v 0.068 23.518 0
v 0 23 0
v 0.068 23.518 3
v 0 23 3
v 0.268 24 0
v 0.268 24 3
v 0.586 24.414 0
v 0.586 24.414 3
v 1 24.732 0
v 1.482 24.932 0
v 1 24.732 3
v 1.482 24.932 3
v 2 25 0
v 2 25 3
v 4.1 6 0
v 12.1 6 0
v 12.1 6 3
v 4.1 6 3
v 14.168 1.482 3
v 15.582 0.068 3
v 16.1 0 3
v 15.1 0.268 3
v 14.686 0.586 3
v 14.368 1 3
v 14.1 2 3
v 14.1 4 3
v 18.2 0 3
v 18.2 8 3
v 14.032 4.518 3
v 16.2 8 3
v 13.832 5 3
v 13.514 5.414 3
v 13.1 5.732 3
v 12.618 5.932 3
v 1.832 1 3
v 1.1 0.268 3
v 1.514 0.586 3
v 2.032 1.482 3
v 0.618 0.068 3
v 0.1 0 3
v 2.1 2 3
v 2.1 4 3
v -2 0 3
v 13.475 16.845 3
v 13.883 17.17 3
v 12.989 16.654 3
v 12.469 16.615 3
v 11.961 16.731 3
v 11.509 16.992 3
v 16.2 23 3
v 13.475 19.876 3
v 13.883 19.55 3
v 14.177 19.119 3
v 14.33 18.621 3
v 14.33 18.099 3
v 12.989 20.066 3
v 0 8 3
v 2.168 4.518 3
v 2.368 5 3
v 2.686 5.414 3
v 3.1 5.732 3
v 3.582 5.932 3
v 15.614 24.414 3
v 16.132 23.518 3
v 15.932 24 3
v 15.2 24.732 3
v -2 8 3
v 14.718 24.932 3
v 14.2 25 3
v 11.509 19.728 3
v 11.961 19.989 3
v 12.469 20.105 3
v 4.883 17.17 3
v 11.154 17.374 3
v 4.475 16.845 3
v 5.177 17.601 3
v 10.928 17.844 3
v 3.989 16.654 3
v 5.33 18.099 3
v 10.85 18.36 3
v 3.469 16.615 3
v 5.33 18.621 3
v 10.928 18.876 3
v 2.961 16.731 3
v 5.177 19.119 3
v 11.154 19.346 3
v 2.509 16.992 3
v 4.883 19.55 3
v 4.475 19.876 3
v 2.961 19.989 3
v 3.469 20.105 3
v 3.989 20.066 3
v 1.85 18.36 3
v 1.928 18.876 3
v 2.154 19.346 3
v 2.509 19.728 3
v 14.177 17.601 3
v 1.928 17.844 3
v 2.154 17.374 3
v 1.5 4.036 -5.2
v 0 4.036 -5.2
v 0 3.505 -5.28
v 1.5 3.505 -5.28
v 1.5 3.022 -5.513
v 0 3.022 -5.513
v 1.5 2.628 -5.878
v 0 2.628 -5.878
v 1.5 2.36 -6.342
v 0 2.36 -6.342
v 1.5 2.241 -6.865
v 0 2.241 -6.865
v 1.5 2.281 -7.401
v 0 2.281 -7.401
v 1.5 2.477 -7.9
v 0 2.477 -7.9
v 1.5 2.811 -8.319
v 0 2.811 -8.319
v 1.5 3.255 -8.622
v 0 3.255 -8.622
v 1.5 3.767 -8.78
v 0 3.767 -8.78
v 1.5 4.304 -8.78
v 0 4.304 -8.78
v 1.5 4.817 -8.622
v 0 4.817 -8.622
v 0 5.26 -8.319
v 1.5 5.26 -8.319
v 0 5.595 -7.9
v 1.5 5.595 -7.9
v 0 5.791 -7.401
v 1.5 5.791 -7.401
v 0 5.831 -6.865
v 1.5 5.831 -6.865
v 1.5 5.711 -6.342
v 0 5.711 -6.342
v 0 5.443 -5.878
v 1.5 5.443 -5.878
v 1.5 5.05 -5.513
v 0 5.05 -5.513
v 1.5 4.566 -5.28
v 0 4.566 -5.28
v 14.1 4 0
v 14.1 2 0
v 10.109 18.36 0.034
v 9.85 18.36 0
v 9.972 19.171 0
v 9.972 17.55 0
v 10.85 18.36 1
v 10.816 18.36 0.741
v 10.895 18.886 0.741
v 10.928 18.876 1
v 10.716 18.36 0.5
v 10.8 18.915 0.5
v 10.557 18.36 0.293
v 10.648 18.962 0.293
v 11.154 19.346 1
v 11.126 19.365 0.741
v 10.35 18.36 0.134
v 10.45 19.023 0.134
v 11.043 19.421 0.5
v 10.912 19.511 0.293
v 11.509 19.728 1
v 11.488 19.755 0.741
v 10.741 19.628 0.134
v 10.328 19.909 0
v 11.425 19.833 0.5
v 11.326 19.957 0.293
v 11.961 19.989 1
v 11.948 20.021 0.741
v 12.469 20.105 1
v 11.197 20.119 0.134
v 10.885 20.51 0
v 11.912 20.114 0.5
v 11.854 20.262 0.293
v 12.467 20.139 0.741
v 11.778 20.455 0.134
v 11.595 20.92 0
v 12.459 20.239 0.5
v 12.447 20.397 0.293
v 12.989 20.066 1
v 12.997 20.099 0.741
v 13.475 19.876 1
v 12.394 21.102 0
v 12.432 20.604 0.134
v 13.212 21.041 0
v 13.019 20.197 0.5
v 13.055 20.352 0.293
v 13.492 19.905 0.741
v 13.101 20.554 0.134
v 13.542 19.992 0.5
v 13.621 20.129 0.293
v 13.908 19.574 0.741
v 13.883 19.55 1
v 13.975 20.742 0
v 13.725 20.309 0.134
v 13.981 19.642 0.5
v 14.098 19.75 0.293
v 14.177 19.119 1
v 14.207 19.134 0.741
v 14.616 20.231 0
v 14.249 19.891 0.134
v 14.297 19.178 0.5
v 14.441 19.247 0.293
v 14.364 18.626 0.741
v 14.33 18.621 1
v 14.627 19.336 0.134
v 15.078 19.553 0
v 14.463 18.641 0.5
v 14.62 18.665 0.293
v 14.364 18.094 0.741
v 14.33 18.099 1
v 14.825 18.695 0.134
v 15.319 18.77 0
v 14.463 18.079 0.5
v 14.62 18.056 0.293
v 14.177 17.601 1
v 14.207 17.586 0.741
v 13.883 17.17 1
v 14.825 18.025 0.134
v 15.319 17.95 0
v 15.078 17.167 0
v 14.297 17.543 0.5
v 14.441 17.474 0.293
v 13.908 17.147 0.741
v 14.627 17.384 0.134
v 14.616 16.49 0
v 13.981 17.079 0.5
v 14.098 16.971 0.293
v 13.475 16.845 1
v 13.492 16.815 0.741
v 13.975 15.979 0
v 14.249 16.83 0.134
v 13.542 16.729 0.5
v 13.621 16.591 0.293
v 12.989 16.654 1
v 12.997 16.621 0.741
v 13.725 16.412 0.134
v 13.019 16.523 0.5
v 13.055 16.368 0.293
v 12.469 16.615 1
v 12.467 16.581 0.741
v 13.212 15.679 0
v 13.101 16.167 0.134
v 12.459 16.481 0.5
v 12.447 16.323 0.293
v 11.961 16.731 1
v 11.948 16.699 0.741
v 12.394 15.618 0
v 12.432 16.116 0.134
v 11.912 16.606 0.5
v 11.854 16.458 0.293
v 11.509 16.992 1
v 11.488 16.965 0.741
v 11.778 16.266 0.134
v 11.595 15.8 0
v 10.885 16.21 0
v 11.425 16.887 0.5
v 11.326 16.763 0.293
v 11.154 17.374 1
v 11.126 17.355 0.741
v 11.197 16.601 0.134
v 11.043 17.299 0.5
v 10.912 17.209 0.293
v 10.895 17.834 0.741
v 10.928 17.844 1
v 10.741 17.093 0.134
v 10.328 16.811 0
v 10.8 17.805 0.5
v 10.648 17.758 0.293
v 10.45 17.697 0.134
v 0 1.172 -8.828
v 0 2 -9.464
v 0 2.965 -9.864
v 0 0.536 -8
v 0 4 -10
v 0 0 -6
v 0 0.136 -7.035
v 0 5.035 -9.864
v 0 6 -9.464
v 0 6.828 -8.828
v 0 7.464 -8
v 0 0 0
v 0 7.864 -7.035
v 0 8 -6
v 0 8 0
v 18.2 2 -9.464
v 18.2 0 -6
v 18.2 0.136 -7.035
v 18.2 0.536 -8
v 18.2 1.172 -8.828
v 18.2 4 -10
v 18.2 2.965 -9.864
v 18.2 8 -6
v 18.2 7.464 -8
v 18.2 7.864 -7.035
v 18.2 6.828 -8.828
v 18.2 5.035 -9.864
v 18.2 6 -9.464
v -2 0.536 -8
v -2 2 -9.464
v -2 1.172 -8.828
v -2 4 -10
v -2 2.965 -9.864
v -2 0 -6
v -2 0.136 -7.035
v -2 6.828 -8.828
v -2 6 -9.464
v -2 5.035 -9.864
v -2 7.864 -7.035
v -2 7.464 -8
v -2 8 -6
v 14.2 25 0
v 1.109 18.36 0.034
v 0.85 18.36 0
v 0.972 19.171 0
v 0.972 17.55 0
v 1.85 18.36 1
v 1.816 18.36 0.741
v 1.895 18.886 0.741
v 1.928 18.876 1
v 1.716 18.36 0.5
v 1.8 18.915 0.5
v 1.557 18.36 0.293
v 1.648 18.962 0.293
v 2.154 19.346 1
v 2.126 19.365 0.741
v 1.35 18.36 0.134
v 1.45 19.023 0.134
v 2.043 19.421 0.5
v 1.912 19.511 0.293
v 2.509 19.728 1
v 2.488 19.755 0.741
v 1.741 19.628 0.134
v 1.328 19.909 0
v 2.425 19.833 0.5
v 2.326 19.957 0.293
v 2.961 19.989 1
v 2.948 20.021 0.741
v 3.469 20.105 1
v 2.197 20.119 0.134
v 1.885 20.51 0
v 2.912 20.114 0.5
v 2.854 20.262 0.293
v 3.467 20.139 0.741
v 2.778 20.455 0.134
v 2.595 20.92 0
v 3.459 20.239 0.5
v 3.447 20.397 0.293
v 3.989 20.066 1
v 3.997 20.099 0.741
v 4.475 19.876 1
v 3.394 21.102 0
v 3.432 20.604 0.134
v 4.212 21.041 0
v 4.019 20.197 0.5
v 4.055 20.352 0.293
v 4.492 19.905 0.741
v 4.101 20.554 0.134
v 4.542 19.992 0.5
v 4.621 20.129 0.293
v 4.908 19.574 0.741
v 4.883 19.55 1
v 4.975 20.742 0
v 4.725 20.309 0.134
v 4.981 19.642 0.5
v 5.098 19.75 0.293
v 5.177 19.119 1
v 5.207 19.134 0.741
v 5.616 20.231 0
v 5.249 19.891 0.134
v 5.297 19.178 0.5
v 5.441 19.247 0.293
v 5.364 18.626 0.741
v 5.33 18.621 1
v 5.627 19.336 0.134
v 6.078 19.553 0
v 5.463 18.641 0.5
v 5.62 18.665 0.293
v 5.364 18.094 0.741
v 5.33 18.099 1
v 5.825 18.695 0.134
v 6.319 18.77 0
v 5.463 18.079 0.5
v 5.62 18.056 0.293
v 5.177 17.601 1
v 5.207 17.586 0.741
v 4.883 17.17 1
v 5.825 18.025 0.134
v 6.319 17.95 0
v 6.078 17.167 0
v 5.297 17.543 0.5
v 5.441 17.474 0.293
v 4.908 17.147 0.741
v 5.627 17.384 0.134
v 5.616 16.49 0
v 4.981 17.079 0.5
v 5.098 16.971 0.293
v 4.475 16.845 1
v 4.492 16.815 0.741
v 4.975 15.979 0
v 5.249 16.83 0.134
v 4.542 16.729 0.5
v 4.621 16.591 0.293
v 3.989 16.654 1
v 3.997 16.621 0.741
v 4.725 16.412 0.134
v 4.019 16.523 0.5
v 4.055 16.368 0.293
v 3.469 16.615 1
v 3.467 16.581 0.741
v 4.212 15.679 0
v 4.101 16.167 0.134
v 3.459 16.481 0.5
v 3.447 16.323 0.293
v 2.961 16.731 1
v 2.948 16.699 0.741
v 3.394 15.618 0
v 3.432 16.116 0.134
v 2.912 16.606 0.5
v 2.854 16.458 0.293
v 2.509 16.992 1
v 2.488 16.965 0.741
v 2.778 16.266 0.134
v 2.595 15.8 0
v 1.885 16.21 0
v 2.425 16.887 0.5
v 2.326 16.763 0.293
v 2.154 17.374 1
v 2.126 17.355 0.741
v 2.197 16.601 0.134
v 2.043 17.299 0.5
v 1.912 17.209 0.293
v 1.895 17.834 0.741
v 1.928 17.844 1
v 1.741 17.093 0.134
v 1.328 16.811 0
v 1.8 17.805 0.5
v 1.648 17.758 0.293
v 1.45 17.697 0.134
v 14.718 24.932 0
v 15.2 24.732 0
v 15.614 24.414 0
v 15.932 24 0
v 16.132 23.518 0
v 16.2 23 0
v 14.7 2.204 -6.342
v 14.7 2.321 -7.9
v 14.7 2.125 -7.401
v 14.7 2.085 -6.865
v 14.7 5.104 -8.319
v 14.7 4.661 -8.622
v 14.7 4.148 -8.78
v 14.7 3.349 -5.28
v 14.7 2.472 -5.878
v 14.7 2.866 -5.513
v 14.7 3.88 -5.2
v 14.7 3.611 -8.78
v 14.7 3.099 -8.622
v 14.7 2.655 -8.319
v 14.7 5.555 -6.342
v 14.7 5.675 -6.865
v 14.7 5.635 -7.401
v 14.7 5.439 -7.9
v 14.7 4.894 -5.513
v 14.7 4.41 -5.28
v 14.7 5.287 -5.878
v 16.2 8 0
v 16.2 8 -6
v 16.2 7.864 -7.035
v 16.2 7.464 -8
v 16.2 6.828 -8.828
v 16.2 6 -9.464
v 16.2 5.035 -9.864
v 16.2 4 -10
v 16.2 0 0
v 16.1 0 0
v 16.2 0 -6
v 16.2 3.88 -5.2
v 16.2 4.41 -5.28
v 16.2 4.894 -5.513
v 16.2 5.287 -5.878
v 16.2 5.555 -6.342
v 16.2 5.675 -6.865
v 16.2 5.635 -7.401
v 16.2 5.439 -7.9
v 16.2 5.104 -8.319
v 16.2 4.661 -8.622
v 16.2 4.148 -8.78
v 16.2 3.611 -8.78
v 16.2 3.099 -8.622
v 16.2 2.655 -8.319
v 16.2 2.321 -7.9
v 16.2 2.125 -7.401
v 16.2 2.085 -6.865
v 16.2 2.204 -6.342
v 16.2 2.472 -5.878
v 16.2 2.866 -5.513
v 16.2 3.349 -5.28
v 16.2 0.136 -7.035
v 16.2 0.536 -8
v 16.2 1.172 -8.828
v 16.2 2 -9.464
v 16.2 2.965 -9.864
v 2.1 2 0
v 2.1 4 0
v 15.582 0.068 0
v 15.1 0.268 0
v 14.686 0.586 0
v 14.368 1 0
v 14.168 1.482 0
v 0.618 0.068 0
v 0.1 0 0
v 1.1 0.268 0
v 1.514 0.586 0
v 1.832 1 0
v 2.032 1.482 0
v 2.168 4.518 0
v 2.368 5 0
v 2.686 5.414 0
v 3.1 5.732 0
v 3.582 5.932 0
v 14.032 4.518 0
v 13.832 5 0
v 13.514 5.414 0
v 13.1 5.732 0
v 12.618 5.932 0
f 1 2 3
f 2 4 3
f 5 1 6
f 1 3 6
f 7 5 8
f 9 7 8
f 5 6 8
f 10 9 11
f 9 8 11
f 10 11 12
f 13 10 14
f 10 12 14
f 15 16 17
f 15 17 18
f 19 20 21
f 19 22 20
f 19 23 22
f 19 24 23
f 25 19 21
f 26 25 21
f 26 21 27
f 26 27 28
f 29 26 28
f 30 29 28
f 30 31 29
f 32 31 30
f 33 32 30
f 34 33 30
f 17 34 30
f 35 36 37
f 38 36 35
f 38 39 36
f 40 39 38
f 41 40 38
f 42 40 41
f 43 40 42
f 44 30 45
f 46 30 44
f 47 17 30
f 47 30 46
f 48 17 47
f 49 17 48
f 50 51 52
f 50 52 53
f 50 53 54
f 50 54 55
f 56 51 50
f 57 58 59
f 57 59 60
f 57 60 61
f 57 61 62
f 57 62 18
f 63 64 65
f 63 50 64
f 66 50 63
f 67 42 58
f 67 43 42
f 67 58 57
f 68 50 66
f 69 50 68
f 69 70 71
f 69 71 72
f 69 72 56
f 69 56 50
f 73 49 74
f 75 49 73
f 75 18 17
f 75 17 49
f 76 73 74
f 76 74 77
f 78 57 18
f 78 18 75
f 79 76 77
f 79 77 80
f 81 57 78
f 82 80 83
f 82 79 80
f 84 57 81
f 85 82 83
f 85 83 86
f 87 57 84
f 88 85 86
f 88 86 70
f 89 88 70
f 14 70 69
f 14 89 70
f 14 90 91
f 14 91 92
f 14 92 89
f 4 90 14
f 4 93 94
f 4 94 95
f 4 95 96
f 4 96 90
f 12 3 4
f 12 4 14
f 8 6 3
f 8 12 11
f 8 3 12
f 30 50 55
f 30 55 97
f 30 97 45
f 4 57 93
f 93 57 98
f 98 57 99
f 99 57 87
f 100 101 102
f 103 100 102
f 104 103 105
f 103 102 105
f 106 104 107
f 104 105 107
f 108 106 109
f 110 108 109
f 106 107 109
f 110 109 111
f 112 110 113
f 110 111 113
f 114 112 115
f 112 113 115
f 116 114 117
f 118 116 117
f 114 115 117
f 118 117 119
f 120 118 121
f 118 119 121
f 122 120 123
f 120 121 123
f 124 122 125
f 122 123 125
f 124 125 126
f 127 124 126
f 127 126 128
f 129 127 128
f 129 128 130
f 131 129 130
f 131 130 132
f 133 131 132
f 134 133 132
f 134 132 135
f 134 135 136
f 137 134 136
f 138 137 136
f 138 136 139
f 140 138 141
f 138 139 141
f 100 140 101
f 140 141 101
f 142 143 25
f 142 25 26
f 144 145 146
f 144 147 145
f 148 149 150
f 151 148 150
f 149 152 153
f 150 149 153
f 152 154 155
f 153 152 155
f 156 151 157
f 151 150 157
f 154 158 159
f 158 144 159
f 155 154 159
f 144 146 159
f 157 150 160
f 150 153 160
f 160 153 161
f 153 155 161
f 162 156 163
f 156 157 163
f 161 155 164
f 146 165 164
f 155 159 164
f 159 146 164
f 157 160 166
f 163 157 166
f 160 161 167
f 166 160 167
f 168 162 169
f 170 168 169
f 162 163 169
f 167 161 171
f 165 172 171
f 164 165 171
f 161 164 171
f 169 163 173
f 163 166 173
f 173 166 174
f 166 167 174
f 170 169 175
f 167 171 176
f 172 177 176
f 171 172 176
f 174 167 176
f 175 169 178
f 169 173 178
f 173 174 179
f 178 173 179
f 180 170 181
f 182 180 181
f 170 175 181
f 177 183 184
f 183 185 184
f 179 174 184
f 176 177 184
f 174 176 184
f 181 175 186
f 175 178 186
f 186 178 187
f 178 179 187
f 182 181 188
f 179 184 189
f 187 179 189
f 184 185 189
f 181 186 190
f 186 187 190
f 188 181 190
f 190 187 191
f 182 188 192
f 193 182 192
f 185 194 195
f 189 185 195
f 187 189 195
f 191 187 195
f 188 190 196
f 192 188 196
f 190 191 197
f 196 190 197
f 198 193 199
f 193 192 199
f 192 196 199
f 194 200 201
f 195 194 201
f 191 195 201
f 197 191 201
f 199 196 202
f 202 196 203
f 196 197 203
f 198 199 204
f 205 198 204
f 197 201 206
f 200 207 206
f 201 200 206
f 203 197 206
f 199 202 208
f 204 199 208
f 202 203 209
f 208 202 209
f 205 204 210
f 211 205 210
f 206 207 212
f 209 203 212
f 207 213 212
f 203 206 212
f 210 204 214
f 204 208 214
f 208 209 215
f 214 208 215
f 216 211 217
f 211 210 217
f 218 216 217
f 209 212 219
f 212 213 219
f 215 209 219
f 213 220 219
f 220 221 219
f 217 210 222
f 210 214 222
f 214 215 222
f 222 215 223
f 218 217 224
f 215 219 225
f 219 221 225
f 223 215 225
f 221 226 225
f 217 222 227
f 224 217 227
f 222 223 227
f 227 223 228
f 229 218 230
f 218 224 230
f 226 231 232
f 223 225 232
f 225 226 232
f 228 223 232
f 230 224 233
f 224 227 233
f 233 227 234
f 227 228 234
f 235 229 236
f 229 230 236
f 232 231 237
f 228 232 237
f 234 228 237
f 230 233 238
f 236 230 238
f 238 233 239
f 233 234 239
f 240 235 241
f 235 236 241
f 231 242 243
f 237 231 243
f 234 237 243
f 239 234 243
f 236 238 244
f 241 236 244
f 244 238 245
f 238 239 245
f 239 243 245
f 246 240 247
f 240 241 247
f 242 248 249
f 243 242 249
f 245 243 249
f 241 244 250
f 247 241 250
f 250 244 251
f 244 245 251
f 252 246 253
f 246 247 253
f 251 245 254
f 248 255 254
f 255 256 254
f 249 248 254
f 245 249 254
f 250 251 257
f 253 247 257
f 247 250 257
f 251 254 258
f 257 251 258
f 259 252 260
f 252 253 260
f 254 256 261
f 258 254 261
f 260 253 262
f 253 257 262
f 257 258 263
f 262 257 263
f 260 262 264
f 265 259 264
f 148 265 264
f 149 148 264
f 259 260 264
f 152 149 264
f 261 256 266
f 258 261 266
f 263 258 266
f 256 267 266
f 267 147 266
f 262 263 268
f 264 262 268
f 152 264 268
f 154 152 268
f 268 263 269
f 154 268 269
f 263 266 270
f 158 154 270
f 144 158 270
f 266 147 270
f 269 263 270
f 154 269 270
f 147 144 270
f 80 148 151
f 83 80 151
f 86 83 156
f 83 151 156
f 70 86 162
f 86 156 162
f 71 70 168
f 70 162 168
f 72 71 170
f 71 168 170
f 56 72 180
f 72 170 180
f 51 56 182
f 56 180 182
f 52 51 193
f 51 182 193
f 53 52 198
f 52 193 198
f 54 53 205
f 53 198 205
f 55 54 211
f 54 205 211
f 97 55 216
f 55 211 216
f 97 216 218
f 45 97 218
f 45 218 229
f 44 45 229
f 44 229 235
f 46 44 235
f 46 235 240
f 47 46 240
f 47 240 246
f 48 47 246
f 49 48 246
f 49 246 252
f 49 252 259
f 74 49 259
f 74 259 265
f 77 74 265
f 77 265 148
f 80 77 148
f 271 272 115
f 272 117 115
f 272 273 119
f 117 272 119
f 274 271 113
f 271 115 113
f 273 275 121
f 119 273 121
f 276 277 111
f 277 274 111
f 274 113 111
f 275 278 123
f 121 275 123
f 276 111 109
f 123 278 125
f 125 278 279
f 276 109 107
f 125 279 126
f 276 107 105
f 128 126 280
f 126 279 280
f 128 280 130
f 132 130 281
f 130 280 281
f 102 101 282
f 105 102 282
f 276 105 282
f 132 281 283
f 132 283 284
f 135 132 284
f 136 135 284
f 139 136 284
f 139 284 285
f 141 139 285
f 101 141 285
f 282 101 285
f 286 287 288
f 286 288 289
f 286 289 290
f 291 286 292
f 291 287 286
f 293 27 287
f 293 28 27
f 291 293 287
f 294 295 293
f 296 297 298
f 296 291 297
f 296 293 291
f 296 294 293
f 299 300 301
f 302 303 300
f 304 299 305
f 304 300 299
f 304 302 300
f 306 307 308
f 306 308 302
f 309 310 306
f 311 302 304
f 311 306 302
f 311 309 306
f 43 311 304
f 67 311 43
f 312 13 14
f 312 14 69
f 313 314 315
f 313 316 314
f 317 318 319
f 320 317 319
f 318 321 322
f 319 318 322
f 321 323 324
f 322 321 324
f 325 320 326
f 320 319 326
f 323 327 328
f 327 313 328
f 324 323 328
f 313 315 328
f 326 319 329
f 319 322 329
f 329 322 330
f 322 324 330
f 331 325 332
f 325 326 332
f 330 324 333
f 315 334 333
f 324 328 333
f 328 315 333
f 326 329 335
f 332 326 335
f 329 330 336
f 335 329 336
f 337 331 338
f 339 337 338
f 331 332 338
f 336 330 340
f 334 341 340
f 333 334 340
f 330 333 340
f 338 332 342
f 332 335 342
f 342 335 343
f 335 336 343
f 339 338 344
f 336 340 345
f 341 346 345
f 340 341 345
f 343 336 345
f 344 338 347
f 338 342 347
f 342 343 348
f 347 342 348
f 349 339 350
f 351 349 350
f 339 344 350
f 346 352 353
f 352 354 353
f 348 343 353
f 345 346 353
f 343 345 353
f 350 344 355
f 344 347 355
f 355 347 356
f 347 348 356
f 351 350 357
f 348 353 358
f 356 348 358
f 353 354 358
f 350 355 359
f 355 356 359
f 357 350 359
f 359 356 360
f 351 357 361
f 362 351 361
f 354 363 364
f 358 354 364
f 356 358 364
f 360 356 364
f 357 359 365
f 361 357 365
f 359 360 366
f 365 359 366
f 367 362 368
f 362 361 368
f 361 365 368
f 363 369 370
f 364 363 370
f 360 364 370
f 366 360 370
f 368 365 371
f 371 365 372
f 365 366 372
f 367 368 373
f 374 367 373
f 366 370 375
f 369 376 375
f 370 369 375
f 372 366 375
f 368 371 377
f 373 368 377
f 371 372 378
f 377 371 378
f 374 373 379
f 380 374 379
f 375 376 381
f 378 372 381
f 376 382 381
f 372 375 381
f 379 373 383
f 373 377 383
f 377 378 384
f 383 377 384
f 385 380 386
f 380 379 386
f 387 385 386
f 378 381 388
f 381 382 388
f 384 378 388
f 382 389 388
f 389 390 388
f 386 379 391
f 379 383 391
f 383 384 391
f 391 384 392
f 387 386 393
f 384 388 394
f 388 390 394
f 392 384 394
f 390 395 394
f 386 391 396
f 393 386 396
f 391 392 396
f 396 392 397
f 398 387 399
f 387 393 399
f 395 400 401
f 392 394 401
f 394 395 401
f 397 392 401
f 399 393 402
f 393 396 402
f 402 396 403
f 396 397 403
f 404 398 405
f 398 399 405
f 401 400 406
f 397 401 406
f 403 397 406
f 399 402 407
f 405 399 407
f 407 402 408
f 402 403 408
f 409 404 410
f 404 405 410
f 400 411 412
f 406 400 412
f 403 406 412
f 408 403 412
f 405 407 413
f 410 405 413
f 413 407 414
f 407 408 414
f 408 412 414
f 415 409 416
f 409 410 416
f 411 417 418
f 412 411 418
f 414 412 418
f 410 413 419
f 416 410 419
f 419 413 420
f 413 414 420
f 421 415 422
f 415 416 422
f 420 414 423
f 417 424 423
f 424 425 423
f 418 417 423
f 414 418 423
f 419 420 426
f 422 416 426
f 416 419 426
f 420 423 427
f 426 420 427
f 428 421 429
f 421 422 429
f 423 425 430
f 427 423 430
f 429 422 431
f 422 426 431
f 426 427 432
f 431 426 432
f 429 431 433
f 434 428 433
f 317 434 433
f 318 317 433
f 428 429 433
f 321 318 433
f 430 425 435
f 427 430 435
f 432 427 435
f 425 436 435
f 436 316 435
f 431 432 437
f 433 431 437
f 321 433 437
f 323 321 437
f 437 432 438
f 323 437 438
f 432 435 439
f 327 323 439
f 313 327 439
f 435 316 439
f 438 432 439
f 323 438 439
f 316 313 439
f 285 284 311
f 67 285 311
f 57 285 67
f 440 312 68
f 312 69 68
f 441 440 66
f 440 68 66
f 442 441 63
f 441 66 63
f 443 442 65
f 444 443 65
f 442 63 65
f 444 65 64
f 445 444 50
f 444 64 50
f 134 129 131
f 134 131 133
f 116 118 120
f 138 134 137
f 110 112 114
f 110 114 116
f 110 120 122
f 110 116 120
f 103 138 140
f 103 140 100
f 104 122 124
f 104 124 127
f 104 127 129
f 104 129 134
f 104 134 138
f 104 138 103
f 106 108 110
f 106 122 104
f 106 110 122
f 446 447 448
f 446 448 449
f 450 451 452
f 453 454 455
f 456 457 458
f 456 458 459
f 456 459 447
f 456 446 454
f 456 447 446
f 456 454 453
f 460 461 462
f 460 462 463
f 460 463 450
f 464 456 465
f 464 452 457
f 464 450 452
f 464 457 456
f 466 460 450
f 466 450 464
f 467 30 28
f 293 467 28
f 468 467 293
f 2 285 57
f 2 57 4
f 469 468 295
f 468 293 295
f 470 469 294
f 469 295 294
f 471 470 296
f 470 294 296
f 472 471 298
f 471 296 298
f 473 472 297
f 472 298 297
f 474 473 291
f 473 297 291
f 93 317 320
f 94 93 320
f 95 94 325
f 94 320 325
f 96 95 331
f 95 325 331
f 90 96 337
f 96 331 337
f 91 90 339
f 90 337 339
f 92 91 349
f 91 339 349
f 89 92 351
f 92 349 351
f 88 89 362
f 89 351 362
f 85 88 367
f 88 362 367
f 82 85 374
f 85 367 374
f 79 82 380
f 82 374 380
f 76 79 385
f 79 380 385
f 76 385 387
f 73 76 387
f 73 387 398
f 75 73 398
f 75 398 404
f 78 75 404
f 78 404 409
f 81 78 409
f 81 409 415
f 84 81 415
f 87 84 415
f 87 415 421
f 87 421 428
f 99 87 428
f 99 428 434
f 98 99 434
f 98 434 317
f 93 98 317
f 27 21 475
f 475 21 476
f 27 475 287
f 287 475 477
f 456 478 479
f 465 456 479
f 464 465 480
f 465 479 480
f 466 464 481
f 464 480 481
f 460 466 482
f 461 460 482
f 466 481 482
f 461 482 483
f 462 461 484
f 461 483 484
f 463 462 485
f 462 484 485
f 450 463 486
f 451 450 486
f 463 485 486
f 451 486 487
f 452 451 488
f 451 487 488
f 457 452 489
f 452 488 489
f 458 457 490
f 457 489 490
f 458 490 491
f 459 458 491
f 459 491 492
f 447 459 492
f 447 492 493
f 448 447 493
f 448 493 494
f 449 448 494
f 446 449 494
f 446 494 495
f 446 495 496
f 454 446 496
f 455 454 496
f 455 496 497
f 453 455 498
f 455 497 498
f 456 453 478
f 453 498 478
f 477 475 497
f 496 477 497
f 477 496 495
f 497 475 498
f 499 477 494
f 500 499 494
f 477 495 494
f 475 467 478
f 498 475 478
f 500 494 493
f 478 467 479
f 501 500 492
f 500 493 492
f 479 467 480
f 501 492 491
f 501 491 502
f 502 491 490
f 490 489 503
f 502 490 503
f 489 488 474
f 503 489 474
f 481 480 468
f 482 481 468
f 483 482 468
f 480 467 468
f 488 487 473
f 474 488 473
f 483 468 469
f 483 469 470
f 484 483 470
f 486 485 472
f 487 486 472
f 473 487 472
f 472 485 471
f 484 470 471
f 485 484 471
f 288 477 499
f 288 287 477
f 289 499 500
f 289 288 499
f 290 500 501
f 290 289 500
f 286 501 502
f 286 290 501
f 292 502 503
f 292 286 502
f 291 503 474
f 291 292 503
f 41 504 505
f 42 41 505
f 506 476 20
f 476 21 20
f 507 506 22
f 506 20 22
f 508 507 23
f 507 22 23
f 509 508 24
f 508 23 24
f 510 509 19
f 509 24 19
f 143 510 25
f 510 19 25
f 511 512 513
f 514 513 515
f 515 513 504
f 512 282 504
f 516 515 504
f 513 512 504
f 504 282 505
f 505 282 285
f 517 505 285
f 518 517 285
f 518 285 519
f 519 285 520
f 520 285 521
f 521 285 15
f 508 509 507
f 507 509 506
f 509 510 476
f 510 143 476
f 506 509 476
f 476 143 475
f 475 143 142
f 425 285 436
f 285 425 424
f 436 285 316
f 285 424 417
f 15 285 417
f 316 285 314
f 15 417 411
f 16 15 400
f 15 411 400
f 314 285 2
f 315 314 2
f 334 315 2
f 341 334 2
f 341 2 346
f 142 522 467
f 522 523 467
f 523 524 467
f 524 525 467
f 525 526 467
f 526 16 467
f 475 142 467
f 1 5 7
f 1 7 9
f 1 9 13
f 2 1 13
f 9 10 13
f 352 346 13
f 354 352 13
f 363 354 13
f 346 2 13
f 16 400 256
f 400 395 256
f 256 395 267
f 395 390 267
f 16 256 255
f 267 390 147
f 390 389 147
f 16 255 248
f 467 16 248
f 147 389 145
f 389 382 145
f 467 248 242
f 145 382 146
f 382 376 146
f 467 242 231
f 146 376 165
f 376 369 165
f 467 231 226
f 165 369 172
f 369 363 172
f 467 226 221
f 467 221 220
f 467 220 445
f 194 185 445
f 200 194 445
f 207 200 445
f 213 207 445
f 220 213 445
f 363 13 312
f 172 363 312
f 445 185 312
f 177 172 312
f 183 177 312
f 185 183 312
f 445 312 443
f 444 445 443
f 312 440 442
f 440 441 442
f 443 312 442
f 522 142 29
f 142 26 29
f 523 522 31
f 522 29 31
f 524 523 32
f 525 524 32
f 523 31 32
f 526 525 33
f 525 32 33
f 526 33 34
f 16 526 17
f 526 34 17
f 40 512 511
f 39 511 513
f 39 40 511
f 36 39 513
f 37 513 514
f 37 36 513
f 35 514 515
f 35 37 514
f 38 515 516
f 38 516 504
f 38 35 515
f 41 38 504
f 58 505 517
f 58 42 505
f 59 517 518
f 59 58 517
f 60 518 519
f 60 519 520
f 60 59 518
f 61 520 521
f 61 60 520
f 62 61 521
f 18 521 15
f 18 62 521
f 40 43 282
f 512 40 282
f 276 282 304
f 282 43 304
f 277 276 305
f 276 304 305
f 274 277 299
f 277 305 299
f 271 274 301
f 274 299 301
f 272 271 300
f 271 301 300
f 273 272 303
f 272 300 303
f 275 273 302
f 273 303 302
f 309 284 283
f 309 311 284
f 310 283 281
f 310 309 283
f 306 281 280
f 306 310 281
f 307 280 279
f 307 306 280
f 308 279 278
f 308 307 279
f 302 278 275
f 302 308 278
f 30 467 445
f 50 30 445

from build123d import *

# Parameters (mm, degrees)
ESQUISSE1_W             = 16.2
ESQUISSE1_H             = 25
BOSS_EXTRU_1_DEPTH      = 3
ESQUISSE2_W             = 13
ESQUISSE2_H             = 8
BOSS_EXTRU_2_DEPTH      = 2
ESQUISSE3_R             = 1.8
BOSS_EXTRU_3_DEPTH      = 1.5
ESQUISSE5_W             = 13
ESQUISSE5_H             = 8
BOSS_EXTRU_4_DEPTH      = 2
ESQUISSE6_R             = 1.8
BOSS_EXTRU_5_DEPTH      = 1.5
ENL_V_MAT_EXTRU_1_REACH = 34.5
ESQUISSE7_W             = 12
ESQUISSE7_H             = 6
ENL_V_MAT_EXTRU_2_REACH = 34.5
ESQUISSE8_R             = 1.75
CONG_1_R                = 1
CONG_2_R                = 4
CONG_3_R                = 2
CONG_4_R                = 2


with BuildPart() as part:
    # Esquisse1 → Boss.-Extru.1 (new body)
    with BuildSketch(Plane.XY):
        with Locations((8.1, 12.5)):
            Rectangle(ESQUISSE1_W, ESQUISSE1_H)
    extrude(amount=BOSS_EXTRU_1_DEPTH)

    # Esquisse2 → Boss.-Extru.2 (add)
    with BuildSketch(Plane.ZY):
        with Locations((-3.5, 4)):
            Rectangle(ESQUISSE2_W, ESQUISSE2_H)
    extrude(amount=BOSS_EXTRU_2_DEPTH)

    # Esquisse3 → Boss.-Extru.3 (add)
    with BuildSketch(Plane(origin=(0, 0, 0), x_dir=(0, 0, -1), z_dir=(1, 0, 0))):
        with Locations(Location((7, 4.035774971, 0), (0, 0, 180))):
            Circle(ESQUISSE3_R)
    extrude(amount=BOSS_EXTRU_3_DEPTH)

    # Esquisse5 → Boss.-Extru.4 (add)
    with BuildSketch(Plane(origin=(16.2, 0, 0), x_dir=(0, 0, -1), z_dir=(1, 0, 0))):
        with Locations((3.5, 4)):
            Rectangle(ESQUISSE5_W, ESQUISSE5_H)
    extrude(amount=BOSS_EXTRU_4_DEPTH)

    # Esquisse6 → Boss.-Extru.5 (add)
    with BuildSketch(Plane.ZY.offset(-16.2)):
        with Locations((-7, 3.879731229)):
            Circle(ESQUISSE6_R)
    extrude(amount=BOSS_EXTRU_5_DEPTH)

    # Esquisse7 → Enlèv. mat.-Extru.1 (cut, up to next)
    with BuildSketch(Plane(origin=(0, 0, 0), x_dir=(-1, 0, 0), z_dir=(0, 0, -1)), mode=Mode.PRIVATE) as enl_v_mat_extru_1_sk1:
        with Locations((-8.1, 3)):
            Rectangle(ESQUISSE7_W, ESQUISSE7_H)
    enl_v_mat_extru_1_tool1 = extrude(enl_v_mat_extru_1_sk1.sketch, amount=-ENL_V_MAT_EXTRU_1_REACH, mode=Mode.PRIVATE) & part.part
    add(enl_v_mat_extru_1_tool1.solids().sort_by_distance((8.1, 3, 0))[0], mode=Mode.SUBTRACT)

    # Esquisse8 → Enlèv. mat.-Extru.2 (cut, up to next)
    with BuildSketch(Plane(origin=(0, 0, 0), x_dir=(-1, 0, 0), z_dir=(0, 0, -1)), mode=Mode.PRIVATE) as enl_v_mat_extru_2_sk1:
        with Locations((-12.6, 18.360124913)):
            Circle(ESQUISSE8_R)
    enl_v_mat_extru_2_tool1 = extrude(enl_v_mat_extru_2_sk1.sketch, amount=-ENL_V_MAT_EXTRU_2_REACH, mode=Mode.PRIVATE) & part.part
    # Esquisse8 → Enlèv. mat.-Extru.2 (cut, up to next)
    with BuildSketch(Plane(origin=(0, 0, 0), x_dir=(-1, 0, 0), z_dir=(0, 0, -1)), mode=Mode.PRIVATE) as enl_v_mat_extru_2_sk2:
        with Locations((-3.6, 18.360124913)):
            Circle(ESQUISSE8_R)
    enl_v_mat_extru_2_tool2 = extrude(enl_v_mat_extru_2_sk2.sketch, amount=-ENL_V_MAT_EXTRU_2_REACH, mode=Mode.PRIVATE) & part.part
    add(enl_v_mat_extru_2_tool1.solids().sort_by_distance((12.6, 18.360125, 0))[0], mode=Mode.SUBTRACT)
    add(enl_v_mat_extru_2_tool2.solids().sort_by_distance((3.6, 18.360125, 0))[0], mode=Mode.SUBTRACT)

    # Congé1
    cong_1_edges = [part.edges().sort_by_distance(p)[0] for p in [
        (14.35, 18.360124913, 0),
        (5.35, 18.360124913, 0),
    ]]
    fillet(cong_1_edges, radius=CONG_1_R)

    # Congé2
    cong_2_edges = [part.edges().sort_by_distance(p)[0] for p in [
        (-1, 8, -10),
        (-1, 0, -10),
        (17.2, 0, -10),
        (17.2, 8, -10),
    ]]
    fillet(cong_2_edges, radius=CONG_2_R - 0.0001)  # a hair under: the kernel refuses the full size

    # Congé3
    cong_3_edges = [part.edges().sort_by_distance(p)[0] for p in [
        (14.1, 0, 1.5),
        (14.1, 6, 1.5),
        (2.1, 6, 1.5),
        (2.1, 0, 1.5),
    ]]
    fillet(cong_3_edges, radius=CONG_3_R)

    # Congé4
    cong_4_edges = [part.edges().sort_by_distance(p)[0] for p in [
        (0, 25, 1.5),
        (16.2, 25, 1.5),
    ]]
    fillet(cong_4_edges, radius=CONG_4_R)


solid = part.part
